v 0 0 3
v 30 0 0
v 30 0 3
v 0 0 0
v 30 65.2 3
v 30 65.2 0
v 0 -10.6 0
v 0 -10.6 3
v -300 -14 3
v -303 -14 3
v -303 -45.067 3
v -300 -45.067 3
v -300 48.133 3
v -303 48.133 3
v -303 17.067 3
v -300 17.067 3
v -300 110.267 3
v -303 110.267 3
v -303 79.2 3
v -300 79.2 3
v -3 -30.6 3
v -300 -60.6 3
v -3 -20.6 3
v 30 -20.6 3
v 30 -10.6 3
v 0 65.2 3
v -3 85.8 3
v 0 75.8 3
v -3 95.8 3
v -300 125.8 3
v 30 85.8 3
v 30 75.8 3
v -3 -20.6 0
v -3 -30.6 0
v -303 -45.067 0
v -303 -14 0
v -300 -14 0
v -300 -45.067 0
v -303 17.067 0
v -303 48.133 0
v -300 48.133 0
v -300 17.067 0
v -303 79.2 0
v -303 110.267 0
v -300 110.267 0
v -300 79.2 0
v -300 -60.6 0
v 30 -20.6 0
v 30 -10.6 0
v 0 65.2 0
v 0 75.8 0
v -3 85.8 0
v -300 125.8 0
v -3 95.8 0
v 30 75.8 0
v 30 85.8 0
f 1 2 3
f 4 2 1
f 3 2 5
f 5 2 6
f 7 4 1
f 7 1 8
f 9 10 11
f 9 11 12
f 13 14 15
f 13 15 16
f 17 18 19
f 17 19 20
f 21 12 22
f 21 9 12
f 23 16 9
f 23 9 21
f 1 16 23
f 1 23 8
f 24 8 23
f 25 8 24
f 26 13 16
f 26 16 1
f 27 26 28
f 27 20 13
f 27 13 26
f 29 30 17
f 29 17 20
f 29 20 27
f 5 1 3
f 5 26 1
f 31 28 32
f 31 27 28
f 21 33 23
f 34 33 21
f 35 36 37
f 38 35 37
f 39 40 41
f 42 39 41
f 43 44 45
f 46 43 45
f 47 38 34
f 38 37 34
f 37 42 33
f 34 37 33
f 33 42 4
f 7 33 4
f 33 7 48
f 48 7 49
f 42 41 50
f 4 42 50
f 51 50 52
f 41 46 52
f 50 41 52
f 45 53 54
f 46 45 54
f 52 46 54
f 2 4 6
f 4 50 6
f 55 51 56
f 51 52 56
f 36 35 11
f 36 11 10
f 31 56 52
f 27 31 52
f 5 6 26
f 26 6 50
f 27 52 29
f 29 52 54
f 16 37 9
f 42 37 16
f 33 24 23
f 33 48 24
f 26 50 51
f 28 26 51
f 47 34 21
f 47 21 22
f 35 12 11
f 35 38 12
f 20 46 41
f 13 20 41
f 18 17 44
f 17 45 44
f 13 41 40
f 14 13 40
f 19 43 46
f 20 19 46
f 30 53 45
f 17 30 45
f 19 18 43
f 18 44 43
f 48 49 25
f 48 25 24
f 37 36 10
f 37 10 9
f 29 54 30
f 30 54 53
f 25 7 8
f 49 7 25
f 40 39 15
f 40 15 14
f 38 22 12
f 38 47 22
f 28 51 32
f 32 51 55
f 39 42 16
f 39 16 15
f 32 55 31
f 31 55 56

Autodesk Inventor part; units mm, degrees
ref_plane "YZ Plane" through (0, 0, 0) normal (1, 0, 0) x (0, 1, 0)
ref_plane "XZ Plane" through (0, 0, 0) normal (0, 1, 0) x (-1, 0, 0)
ref_plane "XY Plane" through (0, 0, 0) normal (0, 0, 1) x (1, 0, 0)
ref_plane "Work Plane1" through (0, 0, 0) normal (0, 0, 1) x (1, 0, 0)
sketch "Sketch1" plane through (0, 0, 0) normal (0, 0, 1) x (1, 0, 0)
  line L0 (0, 75.8) -> (40.7, 75.8) projected
  line L1 (40.7, 65.2) -> (40.7, 75.8) construction
  line L2 (40.7, 65.2) -> (0, 65.2) projected
  line L3 (0, 65.2) -> (0, 75.8) projected
  line L4 (0, 0) -> (0, 65.2) construction
  line L5 (40.7, 0) -> (0, 0) projected
  line L6 (40.7, 0) -> (40.7, 65.2) construction
  line L7 (0, 65.2) -> (40.7, 65.2) projected
  line L8 (0, -10.6) -> (40.7, -10.6) projected
  line L9 (0, 0) -> (0, -10.6)
  line L10 (40.7, -10.6) -> (40.7, 0) construction
  line L11 (40.7, 32.6) -> (0, 32.6) construction
  line L12 (0, 32.6) -> (-300, 32.6) construction
  line L13 (30, 75.8) -> (30, 85.8)
  line L14 (-300, 125.8) -> (-300, 32.6)
  line L15 (-300, -60.6) -> (-300, 32.6)
  line L16 (30, 0) -> (30, 65.2)
  line L17 (-3, 85.8) -> (-3, 95.8)
  line L18 (30, 85.8) -> (-3, 85.8)
  line L19 (-3, 95.8) -> (-300, 125.8)
  line L20 (30, -10.6) -> (30, -20.6)
  line L21 (-3, -20.6) -> (-3, -30.6)
  line L22 (30, -20.6) -> (-3, -20.6)
  line L23 (-3, -30.6) -> (-300, -60.6)
  line L24 (-300, 110.2667) -> (-303, 110.2667)
  line L25 (-303, 110.2667) -> (-303, 79.2)
  line L26 (-303, 79.2) -> (-300, 79.2)
  line L27 (-300, 48.1333) -> (-303, 48.1333)
  line L28 (-303, 48.1333) -> (-303, 32.6)
  line L29 (-303, 32.6) -> (-300, 32.6) construction
  line L30 (-303, 79.2) -> (-303, 48.1333) construction
  line L31 (-303, 110.2667) -> (-303, 125.8) construction
  line L32 (-303, 125.8) -> (-300, 125.8) construction
  line L33 (-301.5, 110.2667) -> (-301.5, 94.7333) construction
  line L34 (-301.5, 94.7333) -> (-303, 94.7333) construction
  line L35 (-300, -45.0667) -> (-303, -45.0667)
  line L36 (-303, -45.0667) -> (-303, -14)
  line L37 (-303, -14) -> (-300, -14)
  line L38 (-300, 17.0667) -> (-303, 17.0667)
  line L39 (-303, 17.0667) -> (-303, 32.6)
  line L40 (-3, 75.8) -> (-3, 85.8) projected
  dimension "d0" = 300
  dimension "d1" = 10
  dimension "d2" = 50
  dimension "d3" = 30
  dimension "d6" = 10
  dimension "d10" = 3
extrude "Extrusion1" add sketch "Sketch1" along normal blind 3
sketch "Sketch3" plane through (0, 0, 3) normal (0, 0, 1) x (1, 0, 0)
  line L0 (0, 75.8) -> (30, 75.8) projected
  line L1 (30, 75.8) -> (30, 85.8) projected
  line L2 (30, 85.8) -> (-3, 85.8) projected
  line L3 (-3, 85.8) -> (-3, 95.8) projected
  line L4 (-3, 95.8) -> (-300, 125.8) projected
  line L5 (-300, 125.8) -> (-300, 110.2667) projected
  line L6 (-300, 110.2667) -> (-303, 110.2667) projected
  line L7 (-303, 110.2667) -> (-303, 79.2) projected
  line L8 (-303, 79.2) -> (-300, 79.2) projected
  line L9 (-300, 79.2) -> (-300, 48.1333) projected
  line L10 (-300, 48.1333) -> (-303, 48.1333) projected
  line L11 (-303, 48.1333) -> (-303, 17.0667) projected
  line L12 (-303, 17.0667) -> (-300, 17.0667) projected
  line L13 (-300, 17.0667) -> (-300, -14) projected
  line L14 (-300, -14) -> (-303, -14) projected
  line L15 (-303, -14) -> (-303, -45.0667) projected
  line L16 (-303, -45.0667) -> (-300, -45.0667) projected
  line L17 (-300, -45.0667) -> (-300, -60.6) projected
  line L18 (-300, -60.6) -> (-3, -30.6) projected
  line L19 (-3, -30.6) -> (-3, -20.6) projected
  line L20 (-3, -20.6) -> (30, -20.6) projected
  line L21 (30, -20.6) -> (30, -10.6) projected
  line L22 (30, -10.6) -> (0, -10.6) projected
  line L23 (0, -10.6) -> (0, 0) projected
  line L24 (0, 0) -> (30, 0) projected
  line L25 (30, 0) -> (30, 65.2) projected
  line L26 (30, 65.2) -> (0, 65.2) projected
  line L27 (0, 65.2) -> (0, 75.8) projected
properties part number "Stand 1" material "Wood (Oak)"
